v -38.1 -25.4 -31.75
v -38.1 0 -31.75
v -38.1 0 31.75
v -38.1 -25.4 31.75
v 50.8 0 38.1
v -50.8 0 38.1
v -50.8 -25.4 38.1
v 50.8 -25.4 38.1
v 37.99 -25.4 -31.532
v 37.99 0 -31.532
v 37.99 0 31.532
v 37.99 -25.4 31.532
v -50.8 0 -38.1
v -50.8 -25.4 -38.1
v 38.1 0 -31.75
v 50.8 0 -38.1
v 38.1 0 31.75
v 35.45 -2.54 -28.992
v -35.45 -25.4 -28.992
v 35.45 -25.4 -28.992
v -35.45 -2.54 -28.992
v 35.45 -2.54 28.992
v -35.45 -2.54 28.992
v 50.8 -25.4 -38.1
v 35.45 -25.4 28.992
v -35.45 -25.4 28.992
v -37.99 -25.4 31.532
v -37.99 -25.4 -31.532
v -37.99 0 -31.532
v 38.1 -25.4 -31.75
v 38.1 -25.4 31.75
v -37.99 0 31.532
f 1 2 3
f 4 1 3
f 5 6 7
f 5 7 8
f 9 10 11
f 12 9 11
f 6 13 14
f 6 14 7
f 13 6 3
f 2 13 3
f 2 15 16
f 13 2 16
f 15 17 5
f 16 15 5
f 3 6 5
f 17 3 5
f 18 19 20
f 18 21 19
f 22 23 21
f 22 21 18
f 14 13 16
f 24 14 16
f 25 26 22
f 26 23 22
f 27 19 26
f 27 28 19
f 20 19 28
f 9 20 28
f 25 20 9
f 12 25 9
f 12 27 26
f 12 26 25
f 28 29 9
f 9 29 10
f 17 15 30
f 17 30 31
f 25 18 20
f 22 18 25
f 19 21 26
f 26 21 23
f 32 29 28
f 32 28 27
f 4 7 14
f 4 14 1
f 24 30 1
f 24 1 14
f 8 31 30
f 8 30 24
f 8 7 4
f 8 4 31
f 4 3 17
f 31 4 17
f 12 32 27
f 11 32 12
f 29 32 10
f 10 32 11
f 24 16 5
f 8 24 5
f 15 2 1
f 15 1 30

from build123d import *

# Parameters (mm, degrees)
F0_W     = 101.6
F0_H     = 76.2
F0_W_2   = 76.2
F0_H_2   = 63.5
F1_DEPTH = 25.4
F2_W     = 75.980544
F2_H     = 63.06307
F3_DEPTH = 25.4
F4_T     = -2.54


with BuildPart() as f1:
    # F0 (on Front) → F1 (new body)
    with BuildSketch(Plane.XZ):
        Rectangle(F0_W, F0_H)
        Rectangle(F0_W_2, F0_H_2, mode=Mode.SUBTRACT)
    extrude(amount=F1_DEPTH)


with BuildPart() as f3:
    # F2 (on Front) → F3 (new body)
    with BuildSketch(Plane.XZ):
        Rectangle(F2_W, F2_H)
    extrude(amount=F3_DEPTH)

    # F4
    f4_openings = [f3.faces().sort_by_distance(p)[0] for p in [
        (0, -25.4, 0),
    ]]
    offset(amount=F4_T, openings=f4_openings)


solid = Compound([f1.part, f3.part])
